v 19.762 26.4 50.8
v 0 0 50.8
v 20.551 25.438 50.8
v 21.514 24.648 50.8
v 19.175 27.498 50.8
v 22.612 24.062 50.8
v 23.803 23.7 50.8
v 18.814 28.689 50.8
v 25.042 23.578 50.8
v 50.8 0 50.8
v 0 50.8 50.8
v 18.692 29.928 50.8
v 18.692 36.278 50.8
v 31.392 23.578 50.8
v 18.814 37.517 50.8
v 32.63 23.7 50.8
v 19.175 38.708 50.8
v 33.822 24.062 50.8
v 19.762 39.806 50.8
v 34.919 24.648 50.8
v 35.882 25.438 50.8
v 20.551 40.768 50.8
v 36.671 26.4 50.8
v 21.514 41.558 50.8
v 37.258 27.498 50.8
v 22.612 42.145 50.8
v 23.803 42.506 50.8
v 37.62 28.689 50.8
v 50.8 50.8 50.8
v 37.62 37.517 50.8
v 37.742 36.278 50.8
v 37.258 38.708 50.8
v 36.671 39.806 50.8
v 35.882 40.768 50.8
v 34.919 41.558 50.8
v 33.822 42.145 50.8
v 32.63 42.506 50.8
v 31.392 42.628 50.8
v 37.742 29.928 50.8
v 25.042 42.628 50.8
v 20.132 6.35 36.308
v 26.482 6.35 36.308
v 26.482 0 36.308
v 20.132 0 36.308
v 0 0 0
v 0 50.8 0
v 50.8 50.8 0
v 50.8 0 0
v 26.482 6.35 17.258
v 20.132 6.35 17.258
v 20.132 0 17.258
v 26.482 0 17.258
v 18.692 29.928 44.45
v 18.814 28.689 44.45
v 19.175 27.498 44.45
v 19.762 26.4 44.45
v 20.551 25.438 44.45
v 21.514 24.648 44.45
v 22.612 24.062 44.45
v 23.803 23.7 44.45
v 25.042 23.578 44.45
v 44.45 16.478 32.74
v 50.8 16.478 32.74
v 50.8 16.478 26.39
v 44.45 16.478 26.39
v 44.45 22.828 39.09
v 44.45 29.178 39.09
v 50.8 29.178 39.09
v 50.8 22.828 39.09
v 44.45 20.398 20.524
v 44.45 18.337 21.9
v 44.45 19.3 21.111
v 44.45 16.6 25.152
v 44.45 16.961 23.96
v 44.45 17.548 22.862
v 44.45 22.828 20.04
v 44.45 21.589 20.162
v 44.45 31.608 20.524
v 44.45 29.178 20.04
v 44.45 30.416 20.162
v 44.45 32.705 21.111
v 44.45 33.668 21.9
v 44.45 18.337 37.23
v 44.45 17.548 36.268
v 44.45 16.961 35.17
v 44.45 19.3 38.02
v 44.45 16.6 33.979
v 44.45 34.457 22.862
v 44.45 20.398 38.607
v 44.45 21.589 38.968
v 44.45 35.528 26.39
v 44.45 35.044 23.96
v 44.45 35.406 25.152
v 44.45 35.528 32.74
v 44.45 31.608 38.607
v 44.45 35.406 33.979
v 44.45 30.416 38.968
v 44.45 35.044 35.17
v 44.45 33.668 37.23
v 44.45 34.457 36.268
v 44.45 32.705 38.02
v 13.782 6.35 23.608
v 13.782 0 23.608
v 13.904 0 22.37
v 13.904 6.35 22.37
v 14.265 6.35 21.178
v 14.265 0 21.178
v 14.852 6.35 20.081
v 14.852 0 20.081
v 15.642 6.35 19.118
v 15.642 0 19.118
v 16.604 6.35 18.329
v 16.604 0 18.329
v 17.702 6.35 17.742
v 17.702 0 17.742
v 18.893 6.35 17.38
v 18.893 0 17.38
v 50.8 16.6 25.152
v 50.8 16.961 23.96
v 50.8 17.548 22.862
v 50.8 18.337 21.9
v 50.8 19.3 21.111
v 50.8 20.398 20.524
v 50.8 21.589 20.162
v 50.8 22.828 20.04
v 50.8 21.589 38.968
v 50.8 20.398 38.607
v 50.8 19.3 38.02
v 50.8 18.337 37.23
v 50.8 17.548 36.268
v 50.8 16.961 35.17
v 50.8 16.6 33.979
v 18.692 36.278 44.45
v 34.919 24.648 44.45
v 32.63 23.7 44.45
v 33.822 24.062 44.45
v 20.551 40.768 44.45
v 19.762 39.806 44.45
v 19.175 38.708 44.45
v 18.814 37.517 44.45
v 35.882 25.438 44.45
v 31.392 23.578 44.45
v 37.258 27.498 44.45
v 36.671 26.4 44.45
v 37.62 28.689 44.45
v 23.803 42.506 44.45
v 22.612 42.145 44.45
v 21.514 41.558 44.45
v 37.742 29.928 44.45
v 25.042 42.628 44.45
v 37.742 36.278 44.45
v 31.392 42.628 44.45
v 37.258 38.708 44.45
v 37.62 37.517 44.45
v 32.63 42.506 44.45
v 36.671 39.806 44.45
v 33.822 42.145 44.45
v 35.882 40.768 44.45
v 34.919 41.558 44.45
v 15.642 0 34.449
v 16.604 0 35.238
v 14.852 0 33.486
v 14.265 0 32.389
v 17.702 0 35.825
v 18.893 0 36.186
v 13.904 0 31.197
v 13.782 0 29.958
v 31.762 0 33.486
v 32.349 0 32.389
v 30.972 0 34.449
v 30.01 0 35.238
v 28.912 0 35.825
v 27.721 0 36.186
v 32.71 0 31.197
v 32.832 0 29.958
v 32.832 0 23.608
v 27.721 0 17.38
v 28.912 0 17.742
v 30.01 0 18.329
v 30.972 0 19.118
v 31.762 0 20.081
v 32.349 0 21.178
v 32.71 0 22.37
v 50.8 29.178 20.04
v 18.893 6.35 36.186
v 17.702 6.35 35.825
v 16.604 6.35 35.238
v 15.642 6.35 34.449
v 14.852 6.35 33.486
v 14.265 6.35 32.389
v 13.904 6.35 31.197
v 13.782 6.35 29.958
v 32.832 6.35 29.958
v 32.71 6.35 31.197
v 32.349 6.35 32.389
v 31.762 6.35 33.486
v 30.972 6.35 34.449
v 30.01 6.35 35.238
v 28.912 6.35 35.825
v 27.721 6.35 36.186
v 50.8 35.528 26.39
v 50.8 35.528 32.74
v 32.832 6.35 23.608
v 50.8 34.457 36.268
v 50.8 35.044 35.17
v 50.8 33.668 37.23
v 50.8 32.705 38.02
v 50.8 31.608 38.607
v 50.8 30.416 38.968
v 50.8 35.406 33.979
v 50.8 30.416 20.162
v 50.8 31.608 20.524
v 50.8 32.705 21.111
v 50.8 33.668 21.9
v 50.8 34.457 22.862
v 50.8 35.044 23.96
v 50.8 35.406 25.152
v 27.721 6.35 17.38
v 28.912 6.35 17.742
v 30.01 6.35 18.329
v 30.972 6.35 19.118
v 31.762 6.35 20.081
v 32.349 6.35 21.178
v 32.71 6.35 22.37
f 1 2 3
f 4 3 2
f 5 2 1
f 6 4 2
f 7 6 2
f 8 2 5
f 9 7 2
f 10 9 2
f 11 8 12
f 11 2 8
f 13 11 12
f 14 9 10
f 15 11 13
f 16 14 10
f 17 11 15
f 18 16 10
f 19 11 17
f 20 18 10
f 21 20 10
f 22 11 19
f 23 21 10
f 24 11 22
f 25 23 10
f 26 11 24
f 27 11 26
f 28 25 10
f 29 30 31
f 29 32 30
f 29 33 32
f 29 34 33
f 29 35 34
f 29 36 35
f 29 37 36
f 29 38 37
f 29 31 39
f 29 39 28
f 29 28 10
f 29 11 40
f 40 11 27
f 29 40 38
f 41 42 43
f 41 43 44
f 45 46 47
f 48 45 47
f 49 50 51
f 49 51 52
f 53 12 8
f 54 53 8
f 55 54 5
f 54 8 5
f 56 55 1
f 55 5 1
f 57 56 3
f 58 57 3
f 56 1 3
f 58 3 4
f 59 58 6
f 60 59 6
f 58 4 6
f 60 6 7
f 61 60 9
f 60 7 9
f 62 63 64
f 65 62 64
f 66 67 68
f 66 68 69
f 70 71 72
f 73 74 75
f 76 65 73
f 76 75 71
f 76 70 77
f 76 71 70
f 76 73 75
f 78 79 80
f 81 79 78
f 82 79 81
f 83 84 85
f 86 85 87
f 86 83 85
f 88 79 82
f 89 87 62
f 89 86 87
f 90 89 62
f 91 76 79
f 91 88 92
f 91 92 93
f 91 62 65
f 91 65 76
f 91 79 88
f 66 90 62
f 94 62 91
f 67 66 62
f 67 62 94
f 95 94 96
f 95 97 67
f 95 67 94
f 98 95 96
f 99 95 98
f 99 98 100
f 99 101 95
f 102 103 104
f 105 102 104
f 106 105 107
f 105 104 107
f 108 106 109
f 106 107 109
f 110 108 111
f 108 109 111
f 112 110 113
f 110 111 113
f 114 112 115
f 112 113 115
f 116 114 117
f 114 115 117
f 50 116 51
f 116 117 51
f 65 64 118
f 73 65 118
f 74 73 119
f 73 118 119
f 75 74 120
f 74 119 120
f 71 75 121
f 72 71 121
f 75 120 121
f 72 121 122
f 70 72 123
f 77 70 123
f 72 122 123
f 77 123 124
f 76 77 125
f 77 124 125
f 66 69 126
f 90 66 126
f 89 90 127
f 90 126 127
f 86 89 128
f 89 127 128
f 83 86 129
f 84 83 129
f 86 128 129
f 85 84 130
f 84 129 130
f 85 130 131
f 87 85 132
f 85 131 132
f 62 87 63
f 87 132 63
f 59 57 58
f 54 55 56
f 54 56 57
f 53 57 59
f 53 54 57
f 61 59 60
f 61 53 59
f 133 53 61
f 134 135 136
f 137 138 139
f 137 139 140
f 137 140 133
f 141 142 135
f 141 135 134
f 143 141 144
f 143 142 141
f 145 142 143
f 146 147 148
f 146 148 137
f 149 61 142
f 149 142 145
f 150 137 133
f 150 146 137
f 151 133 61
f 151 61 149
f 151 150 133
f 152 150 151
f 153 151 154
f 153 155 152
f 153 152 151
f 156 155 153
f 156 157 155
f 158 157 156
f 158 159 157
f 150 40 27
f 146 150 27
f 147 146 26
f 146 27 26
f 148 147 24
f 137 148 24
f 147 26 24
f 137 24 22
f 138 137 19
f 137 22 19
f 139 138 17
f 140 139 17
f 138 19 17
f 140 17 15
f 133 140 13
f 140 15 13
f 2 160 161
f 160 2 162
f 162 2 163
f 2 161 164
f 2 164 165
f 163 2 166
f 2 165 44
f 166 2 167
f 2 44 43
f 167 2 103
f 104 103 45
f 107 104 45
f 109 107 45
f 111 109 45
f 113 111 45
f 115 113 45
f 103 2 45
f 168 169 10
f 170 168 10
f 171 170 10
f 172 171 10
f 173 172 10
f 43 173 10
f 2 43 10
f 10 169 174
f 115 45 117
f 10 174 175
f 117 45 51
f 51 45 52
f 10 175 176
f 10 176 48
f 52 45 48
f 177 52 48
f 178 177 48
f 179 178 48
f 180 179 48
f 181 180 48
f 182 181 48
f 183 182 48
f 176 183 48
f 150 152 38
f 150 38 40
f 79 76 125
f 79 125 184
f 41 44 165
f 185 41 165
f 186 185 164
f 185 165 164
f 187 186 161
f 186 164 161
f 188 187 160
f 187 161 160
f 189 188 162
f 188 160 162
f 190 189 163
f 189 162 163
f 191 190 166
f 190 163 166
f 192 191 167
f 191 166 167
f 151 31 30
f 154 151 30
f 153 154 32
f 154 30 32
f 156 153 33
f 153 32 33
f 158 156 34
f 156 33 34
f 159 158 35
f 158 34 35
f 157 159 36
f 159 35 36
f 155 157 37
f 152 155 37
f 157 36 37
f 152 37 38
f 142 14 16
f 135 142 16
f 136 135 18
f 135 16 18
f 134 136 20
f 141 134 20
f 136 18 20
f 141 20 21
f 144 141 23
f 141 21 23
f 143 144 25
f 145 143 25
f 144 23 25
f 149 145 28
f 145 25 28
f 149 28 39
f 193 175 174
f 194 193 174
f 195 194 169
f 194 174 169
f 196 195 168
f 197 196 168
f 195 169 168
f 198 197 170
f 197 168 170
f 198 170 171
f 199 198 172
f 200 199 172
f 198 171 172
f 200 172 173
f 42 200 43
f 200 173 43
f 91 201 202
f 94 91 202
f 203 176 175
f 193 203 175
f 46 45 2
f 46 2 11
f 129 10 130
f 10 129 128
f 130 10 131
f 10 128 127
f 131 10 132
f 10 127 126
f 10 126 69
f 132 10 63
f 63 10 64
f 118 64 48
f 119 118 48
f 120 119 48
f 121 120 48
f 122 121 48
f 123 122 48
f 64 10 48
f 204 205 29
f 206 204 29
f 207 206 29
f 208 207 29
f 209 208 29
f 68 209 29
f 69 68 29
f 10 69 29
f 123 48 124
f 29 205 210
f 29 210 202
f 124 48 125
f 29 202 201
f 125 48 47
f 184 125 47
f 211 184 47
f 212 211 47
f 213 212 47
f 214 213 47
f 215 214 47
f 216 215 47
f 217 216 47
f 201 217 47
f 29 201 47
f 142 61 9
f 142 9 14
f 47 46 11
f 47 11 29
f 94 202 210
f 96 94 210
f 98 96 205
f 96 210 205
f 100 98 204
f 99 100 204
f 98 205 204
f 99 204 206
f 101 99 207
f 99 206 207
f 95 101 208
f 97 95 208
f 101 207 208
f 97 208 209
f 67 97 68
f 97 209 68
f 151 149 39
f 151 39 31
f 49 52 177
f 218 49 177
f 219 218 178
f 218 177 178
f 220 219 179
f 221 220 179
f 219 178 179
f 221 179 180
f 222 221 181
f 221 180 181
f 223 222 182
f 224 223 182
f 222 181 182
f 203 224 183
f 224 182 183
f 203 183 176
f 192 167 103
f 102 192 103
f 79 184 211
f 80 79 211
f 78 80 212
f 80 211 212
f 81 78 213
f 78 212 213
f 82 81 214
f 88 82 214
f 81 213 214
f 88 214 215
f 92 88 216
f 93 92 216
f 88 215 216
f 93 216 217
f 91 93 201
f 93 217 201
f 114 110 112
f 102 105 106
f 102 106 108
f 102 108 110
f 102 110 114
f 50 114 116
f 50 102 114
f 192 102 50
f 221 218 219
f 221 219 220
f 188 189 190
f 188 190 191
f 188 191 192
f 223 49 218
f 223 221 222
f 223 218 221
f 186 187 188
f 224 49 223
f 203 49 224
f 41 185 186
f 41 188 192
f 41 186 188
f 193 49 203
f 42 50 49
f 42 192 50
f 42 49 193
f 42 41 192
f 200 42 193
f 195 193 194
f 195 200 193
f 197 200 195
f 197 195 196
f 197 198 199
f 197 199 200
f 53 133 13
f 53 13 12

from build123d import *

# Parameters (mm, degrees)
F0_W     = 50.8
F0_H     = 50.8
F1_DEPTH = 50.8
F3_DEPTH = 6.35
F5_DEPTH = 6.35
F7_DEPTH = 6.35


with BuildPart() as f1:
    # F0 (on Top) → F1 (new body)
    with BuildSketch(Plane.XY):
        with Locations((25.4, 25.4)):
            Rectangle(F0_W, F0_H)
    extrude(amount=F1_DEPTH)

    # F2 (on face) → F3 (cut)
    with BuildSketch(Plane.XY.offset(50.8)):
        with BuildLine():
            ThreePointArc((18.691622, 29.928316), (20.551494, 25.438188), (25.041622, 23.578316))
            Line((25.041622, 23.578316), (31.391622, 23.578316))
            ThreePointArc((31.391622, 23.578316), (35.88175, 25.438188), (37.741622, 29.928316))
            Line((37.741622, 29.928316), (37.741622, 36.278316))
            ThreePointArc((37.741622, 36.278316), (35.88175, 40.768444), (31.391622, 42.628316))
            Line((31.391622, 42.628316), (25.041622, 42.628316))
            ThreePointArc((25.041622, 42.628316), (20.551494, 40.768444), (18.691622, 36.278316))
            Line((18.691622, 36.278316), (18.691622, 29.928316))
        make_face()
    extrude(amount=-F3_DEPTH, mode=Mode.SUBTRACT)

    # F4 (on face) → F5 (cut)
    with BuildSketch(Plane.XZ):
        with BuildLine():
            ThreePointArc((13.781983, 23.608483), (15.641855, 19.118355), (20.131983, 17.258483))
            Line((20.131983, 17.258483), (26.481983, 17.258483))
            ThreePointArc((26.481983, 17.258483), (30.972111, 19.118355), (32.831983, 23.608483))
            Line((32.831983, 23.608483), (32.831983, 29.958483))
            ThreePointArc((32.831983, 29.958483), (30.972111, 34.448611), (26.481983, 36.308483))
            Line((26.481983, 36.308483), (20.131983, 36.308483))
            ThreePointArc((20.131983, 36.308483), (15.641855, 34.448611), (13.781983, 29.958483))
            Line((13.781983, 29.958483), (13.781983, 23.608483))
        make_face()
    extrude(amount=-F5_DEPTH, mode=Mode.SUBTRACT)

    # F6 (on face) → F7 (cut)
    with BuildSketch(Plane.YZ.offset(50.8)):
        with BuildLine():
            Line((22.827603, 20.040363), (29.177603, 20.040363))
            ThreePointArc((29.177603, 20.040363), (33.667732, 21.900235), (35.527603, 26.390363))
            Line((35.527603, 26.390363), (35.527603, 32.740363))
            ThreePointArc((35.527603, 32.740363), (33.667732, 37.230491), (29.177603, 39.090363))
            Line((29.177603, 39.090363), (22.827603, 39.090363))
            ThreePointArc((22.827603, 39.090363), (18.337475, 37.230491), (16.477603, 32.740363))
            Line((16.477603, 32.740363), (16.477603, 26.390363))
            ThreePointArc((16.477603, 26.390363), (18.337475, 21.900235), (22.827603, 20.040363))
        make_face()
    extrude(amount=-F7_DEPTH, mode=Mode.SUBTRACT)


solid = f1.part
